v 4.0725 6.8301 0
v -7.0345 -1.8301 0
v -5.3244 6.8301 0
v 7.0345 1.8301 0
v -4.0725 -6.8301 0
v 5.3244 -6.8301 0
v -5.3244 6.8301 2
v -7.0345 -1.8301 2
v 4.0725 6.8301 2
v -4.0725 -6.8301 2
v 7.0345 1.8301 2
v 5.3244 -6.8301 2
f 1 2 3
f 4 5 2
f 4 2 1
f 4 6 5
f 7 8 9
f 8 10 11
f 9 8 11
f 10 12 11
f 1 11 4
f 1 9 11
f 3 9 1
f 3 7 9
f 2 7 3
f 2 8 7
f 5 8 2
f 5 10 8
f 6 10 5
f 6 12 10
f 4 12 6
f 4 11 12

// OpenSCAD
linear_extrude(2) projection() rotate([30, 20, 0]) cube(10, center = true);
